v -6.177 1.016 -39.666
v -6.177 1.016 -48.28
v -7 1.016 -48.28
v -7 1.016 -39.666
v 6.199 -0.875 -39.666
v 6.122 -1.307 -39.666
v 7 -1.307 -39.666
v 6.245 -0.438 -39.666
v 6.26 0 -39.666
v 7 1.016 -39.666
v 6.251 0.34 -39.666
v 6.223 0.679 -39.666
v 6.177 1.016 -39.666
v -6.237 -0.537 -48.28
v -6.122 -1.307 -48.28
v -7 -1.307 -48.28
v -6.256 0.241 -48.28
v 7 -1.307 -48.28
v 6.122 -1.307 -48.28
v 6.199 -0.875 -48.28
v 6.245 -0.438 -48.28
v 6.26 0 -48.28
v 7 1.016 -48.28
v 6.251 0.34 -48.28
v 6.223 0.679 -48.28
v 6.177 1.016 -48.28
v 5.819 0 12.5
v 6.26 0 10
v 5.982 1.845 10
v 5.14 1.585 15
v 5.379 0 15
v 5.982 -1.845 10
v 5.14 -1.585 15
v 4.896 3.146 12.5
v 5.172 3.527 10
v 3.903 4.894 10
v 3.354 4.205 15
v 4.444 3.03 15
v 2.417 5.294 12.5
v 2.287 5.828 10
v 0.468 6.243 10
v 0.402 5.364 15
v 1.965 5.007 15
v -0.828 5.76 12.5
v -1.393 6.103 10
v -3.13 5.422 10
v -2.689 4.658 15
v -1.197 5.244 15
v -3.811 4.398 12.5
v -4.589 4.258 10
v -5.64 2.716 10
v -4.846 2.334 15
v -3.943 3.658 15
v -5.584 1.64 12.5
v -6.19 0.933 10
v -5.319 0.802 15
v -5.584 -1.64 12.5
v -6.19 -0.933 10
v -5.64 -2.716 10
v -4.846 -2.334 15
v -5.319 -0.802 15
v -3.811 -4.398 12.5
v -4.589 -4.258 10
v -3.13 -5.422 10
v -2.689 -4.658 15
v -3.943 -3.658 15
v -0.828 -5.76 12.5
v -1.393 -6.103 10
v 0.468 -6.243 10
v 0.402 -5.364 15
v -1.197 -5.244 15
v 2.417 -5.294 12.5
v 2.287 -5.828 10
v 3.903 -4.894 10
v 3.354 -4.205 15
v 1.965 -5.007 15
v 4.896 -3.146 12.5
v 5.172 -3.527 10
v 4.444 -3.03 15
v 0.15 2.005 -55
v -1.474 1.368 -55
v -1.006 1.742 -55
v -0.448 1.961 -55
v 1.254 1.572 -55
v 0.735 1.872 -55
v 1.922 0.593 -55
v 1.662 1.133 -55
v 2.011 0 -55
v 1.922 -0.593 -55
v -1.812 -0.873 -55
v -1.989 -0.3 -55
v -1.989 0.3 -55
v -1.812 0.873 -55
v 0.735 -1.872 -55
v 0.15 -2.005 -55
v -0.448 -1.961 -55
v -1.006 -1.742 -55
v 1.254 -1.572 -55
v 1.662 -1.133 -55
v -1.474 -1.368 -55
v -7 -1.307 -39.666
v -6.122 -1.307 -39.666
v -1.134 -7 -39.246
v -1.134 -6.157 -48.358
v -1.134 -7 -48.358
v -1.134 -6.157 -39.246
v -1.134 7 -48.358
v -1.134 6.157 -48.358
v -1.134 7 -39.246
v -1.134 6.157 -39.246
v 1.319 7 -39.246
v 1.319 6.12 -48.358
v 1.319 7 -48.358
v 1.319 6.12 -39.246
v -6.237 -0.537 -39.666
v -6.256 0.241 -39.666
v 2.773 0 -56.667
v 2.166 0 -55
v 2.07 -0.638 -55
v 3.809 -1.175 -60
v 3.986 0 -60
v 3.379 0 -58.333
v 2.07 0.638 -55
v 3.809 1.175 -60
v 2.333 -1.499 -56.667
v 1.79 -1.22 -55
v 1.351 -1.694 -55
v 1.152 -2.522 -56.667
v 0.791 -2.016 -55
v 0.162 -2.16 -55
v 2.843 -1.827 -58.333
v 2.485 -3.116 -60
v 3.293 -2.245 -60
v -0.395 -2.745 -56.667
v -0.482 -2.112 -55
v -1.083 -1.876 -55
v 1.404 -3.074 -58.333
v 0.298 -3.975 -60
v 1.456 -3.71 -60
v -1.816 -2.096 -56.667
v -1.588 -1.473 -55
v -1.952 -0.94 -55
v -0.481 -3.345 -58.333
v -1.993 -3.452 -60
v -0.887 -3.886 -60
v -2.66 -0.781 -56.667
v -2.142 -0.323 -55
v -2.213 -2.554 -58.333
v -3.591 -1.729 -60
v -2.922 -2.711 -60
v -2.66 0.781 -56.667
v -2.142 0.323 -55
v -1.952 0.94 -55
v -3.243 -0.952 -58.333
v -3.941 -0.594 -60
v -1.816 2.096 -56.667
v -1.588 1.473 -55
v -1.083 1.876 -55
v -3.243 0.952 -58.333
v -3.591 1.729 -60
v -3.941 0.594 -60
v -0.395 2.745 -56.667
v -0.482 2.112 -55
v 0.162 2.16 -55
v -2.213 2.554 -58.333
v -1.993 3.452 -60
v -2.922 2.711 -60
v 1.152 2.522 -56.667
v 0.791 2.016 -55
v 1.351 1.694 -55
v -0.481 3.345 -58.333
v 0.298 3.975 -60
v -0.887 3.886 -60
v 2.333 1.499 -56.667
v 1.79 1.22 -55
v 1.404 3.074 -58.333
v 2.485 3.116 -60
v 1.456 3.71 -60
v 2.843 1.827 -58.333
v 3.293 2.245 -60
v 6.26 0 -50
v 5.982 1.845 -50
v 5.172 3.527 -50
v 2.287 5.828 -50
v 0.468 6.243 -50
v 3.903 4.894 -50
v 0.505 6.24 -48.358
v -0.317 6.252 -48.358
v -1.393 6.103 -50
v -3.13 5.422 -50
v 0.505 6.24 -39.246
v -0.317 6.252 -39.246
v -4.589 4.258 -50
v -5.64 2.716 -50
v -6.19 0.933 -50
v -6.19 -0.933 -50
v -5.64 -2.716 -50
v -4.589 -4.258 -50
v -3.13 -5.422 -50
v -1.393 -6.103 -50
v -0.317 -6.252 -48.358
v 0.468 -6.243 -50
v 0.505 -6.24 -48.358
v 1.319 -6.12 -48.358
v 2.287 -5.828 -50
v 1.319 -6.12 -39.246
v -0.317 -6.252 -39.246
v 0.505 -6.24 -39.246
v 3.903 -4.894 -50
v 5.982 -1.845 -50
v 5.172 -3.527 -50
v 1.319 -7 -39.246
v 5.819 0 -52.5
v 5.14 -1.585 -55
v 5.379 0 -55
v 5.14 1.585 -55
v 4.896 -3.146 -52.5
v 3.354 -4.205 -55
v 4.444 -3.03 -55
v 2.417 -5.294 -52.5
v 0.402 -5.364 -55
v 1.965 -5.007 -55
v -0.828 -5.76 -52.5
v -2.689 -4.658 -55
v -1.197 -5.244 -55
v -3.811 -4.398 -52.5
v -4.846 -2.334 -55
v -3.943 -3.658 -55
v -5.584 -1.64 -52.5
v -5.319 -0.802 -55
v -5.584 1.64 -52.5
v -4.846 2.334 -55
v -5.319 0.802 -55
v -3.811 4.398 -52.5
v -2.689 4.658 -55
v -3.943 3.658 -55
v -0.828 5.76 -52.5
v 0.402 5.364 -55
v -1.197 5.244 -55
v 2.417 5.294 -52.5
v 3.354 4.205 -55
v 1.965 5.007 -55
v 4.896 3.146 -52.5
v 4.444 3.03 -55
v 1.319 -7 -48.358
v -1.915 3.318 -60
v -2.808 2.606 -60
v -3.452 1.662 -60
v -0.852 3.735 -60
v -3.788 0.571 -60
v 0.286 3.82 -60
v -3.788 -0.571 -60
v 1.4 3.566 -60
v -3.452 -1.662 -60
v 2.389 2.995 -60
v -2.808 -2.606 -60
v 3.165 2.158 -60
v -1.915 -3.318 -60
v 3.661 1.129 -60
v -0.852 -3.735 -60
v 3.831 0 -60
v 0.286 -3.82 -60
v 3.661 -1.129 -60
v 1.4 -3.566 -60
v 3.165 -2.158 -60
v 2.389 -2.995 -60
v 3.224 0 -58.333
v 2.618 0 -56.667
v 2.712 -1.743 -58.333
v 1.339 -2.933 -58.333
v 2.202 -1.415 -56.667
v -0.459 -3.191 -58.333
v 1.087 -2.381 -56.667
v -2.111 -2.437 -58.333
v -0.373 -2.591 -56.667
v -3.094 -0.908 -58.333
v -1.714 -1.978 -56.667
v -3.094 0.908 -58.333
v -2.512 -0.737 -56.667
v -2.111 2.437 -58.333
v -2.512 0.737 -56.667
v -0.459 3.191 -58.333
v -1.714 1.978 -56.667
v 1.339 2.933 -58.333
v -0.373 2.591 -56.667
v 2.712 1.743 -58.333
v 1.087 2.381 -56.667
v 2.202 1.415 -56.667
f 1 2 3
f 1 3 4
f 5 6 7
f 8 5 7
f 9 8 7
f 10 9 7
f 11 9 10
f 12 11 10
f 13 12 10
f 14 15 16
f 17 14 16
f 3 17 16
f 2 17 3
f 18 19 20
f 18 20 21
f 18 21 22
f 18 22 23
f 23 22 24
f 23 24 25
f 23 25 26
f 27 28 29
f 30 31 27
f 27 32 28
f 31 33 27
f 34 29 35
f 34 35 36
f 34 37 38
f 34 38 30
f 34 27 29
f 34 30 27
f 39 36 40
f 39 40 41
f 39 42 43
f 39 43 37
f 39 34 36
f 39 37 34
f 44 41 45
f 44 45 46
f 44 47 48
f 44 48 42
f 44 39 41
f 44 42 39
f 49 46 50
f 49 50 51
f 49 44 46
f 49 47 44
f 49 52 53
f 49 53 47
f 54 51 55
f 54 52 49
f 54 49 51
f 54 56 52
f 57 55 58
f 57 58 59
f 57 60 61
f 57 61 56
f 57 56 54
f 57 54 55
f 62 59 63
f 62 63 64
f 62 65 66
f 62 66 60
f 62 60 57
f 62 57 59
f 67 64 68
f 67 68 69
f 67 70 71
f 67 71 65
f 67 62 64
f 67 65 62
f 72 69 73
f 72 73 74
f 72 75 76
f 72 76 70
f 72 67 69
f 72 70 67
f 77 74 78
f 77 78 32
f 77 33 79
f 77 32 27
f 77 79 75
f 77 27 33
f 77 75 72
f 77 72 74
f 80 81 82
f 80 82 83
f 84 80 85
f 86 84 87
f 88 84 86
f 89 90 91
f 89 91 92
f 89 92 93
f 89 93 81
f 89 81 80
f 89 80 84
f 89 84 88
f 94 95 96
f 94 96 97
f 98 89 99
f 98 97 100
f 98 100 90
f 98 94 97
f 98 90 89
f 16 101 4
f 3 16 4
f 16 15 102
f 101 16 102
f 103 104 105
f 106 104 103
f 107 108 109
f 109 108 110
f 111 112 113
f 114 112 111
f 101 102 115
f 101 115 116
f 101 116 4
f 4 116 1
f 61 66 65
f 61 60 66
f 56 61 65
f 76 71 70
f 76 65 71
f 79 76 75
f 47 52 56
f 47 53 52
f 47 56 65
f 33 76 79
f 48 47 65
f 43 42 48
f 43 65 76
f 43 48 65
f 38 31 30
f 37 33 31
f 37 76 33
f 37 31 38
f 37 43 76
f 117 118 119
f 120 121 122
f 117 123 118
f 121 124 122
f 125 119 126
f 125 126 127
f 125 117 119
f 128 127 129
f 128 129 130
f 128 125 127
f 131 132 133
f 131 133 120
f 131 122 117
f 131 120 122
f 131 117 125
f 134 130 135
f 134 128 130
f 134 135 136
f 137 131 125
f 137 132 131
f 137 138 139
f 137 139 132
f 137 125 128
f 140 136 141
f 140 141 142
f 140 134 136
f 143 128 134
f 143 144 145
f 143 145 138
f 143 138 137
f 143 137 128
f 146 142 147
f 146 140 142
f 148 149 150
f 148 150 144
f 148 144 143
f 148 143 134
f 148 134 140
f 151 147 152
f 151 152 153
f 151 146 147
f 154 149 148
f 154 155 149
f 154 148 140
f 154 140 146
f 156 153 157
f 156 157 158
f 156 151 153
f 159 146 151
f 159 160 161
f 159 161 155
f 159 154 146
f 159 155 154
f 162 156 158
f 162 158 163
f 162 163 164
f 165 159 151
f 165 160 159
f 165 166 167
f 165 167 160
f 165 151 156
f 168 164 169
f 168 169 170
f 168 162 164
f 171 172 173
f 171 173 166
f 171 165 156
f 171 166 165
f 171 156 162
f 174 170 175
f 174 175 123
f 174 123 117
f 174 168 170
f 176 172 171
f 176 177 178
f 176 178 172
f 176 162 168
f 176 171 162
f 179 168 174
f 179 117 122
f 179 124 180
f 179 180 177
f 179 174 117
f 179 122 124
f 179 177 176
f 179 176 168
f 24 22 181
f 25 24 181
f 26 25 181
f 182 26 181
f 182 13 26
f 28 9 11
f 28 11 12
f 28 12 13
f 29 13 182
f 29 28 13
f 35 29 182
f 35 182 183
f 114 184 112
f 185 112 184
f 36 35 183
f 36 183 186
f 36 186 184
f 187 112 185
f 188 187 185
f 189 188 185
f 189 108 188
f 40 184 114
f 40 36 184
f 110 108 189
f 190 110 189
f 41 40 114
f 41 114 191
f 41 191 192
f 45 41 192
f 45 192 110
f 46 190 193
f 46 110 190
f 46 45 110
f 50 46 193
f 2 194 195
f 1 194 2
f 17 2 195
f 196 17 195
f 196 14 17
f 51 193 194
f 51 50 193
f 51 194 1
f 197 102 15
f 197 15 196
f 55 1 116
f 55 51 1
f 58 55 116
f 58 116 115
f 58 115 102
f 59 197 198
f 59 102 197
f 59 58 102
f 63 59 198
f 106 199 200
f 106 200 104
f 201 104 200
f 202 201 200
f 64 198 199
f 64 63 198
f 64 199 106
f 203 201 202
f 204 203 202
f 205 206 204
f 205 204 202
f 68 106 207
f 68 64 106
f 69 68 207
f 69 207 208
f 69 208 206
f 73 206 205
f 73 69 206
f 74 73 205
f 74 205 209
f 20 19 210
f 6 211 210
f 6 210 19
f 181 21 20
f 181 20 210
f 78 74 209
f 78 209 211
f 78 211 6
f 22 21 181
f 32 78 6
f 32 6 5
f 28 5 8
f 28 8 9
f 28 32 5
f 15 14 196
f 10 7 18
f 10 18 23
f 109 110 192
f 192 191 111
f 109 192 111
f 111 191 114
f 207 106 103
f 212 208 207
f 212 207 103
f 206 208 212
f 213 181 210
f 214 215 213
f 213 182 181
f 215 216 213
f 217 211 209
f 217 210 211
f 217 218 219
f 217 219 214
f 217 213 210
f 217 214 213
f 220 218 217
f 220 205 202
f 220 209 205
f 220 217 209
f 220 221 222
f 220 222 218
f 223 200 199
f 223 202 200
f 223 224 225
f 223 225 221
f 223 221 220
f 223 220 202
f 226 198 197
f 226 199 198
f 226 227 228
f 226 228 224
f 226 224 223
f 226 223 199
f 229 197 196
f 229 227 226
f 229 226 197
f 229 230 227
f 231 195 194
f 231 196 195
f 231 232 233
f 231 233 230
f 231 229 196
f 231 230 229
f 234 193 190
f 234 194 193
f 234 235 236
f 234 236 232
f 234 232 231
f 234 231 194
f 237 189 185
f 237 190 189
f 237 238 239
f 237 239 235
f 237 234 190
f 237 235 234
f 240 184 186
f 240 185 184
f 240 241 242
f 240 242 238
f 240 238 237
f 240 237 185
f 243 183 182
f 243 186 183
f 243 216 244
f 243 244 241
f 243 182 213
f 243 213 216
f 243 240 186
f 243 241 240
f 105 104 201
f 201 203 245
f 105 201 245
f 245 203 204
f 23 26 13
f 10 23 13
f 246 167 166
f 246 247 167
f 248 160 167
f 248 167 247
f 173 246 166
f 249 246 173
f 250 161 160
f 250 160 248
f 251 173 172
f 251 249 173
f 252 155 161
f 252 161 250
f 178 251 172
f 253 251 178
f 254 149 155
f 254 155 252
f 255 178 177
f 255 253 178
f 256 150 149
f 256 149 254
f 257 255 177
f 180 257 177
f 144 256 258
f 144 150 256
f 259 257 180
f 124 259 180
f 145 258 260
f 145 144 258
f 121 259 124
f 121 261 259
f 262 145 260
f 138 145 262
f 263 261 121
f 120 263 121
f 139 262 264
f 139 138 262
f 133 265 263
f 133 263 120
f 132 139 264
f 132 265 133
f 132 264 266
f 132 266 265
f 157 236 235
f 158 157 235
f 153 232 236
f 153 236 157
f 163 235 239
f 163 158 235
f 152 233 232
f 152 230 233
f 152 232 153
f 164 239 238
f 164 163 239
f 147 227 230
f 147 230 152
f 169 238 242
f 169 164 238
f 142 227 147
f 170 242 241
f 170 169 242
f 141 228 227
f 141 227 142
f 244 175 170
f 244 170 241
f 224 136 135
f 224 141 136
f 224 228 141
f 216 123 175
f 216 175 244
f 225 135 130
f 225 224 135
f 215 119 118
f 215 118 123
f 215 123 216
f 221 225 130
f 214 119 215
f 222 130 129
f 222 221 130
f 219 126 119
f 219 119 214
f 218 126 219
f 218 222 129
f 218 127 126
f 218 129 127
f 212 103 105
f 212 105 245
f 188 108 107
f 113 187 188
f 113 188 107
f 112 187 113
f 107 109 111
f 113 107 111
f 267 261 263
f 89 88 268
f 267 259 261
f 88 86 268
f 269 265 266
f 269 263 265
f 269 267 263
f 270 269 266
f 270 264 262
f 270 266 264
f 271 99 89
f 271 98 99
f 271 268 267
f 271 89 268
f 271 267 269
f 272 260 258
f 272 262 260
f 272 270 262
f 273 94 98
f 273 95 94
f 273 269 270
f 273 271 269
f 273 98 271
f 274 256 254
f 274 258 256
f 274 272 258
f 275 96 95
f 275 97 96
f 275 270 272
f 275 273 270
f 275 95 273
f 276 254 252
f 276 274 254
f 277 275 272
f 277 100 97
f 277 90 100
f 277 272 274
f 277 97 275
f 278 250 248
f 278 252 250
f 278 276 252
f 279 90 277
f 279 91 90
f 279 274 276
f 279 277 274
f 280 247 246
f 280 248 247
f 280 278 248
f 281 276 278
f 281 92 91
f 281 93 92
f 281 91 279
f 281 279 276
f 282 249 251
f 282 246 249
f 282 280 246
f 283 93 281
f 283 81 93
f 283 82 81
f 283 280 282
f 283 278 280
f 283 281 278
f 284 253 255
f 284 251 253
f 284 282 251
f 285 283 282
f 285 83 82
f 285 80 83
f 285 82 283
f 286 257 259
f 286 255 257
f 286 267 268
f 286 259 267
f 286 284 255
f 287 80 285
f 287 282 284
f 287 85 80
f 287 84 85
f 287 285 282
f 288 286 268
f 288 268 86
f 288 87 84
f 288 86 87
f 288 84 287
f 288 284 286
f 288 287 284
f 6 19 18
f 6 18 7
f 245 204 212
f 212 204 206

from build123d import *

# Parameters (mm, degrees)
F0_R           = 6.260280421
F1_DEPTH       = 10
F1_DEPTH_BACK  = 50
F1_FACE_R      = 6.260280421
F2_DEPTH       = 5
F2_TAPER       = 10
F1_FACE1_R     = 6.260280421
F3_DEPTH       = 5
F3_TAPER       = 10
F4_R           = 2.1661571195
F5_DEPTH       = 5
F5_TAPER       = -20
F6_R           = 3.8309083686
F7_DEPTH       = 5
F7_TAPER       = 20
F8_W           = 2.4537248537
F8_H           = 9.1121047735
F9_DEPTH       = 7
F9_DEPTH_BACK  = 7
F10_W          = 2.3227367783
F10_H          = 8.6134821177
F11_DEPTH      = 7
F11_DEPTH_BACK = 7


with BuildPart() as f1:
    # F0 (on Top) → F1 (new body, two sides)
    with BuildSketch(Plane.XY) as f1_sk:
        Circle(F0_R)
    extrude(amount=F1_DEPTH)
    extrude(f1_sk.sketch, amount=-F1_DEPTH_BACK)

    # F1_face (on face) → F2 (join)
    with BuildSketch(Plane.XY.offset(10)):
        Circle(F1_FACE_R)
    extrude(amount=F2_DEPTH, taper=F2_TAPER)

    # F1_face1 (on face) → F3 (join)
    with BuildSketch(Plane(origin=(0, 0, -50), x_dir=(1, 0, 0), z_dir=(0, 0, -1))):
        Circle(F1_FACE1_R)
    extrude(amount=F3_DEPTH, taper=F3_TAPER)

    # F4 (on face) → F5 (join)
    with BuildSketch(Plane(origin=(0, 0, -55), x_dir=(1, 0, 0), z_dir=(0, 0, -1))):
        Circle(F4_R)
    extrude(amount=F5_DEPTH, taper=F5_TAPER)

    # F6 (on face) → F7 (cut)
    with BuildSketch(Plane(origin=(0, 0, -60), x_dir=(1, 0, 0), z_dir=(0, 0, -1))):
        Circle(F6_R)
    extrude(amount=-F7_DEPTH, taper=F7_TAPER, mode=Mode.SUBTRACT)

    # F8 (on Front) → F9 (join, two sides)
    with BuildSketch(Plane.XZ) as f9_sk:
        with Locations((0.0925256172, -43.8020937145)):
            Rectangle(F8_W, F8_H)
    extrude(amount=F9_DEPTH)
    extrude(f9_sk.sketch, amount=-F9_DEPTH_BACK)

    # F10 (on Right) → F11 (join, two sides)
    with BuildSketch(Plane.YZ) as f11_sk:
        with Locations((-0.1453745062, -43.9728200436)):
            Rectangle(F10_W, F10_H)
    extrude(amount=F11_DEPTH)
    extrude(f11_sk.sketch, amount=-F11_DEPTH_BACK)


solid = f1.part
